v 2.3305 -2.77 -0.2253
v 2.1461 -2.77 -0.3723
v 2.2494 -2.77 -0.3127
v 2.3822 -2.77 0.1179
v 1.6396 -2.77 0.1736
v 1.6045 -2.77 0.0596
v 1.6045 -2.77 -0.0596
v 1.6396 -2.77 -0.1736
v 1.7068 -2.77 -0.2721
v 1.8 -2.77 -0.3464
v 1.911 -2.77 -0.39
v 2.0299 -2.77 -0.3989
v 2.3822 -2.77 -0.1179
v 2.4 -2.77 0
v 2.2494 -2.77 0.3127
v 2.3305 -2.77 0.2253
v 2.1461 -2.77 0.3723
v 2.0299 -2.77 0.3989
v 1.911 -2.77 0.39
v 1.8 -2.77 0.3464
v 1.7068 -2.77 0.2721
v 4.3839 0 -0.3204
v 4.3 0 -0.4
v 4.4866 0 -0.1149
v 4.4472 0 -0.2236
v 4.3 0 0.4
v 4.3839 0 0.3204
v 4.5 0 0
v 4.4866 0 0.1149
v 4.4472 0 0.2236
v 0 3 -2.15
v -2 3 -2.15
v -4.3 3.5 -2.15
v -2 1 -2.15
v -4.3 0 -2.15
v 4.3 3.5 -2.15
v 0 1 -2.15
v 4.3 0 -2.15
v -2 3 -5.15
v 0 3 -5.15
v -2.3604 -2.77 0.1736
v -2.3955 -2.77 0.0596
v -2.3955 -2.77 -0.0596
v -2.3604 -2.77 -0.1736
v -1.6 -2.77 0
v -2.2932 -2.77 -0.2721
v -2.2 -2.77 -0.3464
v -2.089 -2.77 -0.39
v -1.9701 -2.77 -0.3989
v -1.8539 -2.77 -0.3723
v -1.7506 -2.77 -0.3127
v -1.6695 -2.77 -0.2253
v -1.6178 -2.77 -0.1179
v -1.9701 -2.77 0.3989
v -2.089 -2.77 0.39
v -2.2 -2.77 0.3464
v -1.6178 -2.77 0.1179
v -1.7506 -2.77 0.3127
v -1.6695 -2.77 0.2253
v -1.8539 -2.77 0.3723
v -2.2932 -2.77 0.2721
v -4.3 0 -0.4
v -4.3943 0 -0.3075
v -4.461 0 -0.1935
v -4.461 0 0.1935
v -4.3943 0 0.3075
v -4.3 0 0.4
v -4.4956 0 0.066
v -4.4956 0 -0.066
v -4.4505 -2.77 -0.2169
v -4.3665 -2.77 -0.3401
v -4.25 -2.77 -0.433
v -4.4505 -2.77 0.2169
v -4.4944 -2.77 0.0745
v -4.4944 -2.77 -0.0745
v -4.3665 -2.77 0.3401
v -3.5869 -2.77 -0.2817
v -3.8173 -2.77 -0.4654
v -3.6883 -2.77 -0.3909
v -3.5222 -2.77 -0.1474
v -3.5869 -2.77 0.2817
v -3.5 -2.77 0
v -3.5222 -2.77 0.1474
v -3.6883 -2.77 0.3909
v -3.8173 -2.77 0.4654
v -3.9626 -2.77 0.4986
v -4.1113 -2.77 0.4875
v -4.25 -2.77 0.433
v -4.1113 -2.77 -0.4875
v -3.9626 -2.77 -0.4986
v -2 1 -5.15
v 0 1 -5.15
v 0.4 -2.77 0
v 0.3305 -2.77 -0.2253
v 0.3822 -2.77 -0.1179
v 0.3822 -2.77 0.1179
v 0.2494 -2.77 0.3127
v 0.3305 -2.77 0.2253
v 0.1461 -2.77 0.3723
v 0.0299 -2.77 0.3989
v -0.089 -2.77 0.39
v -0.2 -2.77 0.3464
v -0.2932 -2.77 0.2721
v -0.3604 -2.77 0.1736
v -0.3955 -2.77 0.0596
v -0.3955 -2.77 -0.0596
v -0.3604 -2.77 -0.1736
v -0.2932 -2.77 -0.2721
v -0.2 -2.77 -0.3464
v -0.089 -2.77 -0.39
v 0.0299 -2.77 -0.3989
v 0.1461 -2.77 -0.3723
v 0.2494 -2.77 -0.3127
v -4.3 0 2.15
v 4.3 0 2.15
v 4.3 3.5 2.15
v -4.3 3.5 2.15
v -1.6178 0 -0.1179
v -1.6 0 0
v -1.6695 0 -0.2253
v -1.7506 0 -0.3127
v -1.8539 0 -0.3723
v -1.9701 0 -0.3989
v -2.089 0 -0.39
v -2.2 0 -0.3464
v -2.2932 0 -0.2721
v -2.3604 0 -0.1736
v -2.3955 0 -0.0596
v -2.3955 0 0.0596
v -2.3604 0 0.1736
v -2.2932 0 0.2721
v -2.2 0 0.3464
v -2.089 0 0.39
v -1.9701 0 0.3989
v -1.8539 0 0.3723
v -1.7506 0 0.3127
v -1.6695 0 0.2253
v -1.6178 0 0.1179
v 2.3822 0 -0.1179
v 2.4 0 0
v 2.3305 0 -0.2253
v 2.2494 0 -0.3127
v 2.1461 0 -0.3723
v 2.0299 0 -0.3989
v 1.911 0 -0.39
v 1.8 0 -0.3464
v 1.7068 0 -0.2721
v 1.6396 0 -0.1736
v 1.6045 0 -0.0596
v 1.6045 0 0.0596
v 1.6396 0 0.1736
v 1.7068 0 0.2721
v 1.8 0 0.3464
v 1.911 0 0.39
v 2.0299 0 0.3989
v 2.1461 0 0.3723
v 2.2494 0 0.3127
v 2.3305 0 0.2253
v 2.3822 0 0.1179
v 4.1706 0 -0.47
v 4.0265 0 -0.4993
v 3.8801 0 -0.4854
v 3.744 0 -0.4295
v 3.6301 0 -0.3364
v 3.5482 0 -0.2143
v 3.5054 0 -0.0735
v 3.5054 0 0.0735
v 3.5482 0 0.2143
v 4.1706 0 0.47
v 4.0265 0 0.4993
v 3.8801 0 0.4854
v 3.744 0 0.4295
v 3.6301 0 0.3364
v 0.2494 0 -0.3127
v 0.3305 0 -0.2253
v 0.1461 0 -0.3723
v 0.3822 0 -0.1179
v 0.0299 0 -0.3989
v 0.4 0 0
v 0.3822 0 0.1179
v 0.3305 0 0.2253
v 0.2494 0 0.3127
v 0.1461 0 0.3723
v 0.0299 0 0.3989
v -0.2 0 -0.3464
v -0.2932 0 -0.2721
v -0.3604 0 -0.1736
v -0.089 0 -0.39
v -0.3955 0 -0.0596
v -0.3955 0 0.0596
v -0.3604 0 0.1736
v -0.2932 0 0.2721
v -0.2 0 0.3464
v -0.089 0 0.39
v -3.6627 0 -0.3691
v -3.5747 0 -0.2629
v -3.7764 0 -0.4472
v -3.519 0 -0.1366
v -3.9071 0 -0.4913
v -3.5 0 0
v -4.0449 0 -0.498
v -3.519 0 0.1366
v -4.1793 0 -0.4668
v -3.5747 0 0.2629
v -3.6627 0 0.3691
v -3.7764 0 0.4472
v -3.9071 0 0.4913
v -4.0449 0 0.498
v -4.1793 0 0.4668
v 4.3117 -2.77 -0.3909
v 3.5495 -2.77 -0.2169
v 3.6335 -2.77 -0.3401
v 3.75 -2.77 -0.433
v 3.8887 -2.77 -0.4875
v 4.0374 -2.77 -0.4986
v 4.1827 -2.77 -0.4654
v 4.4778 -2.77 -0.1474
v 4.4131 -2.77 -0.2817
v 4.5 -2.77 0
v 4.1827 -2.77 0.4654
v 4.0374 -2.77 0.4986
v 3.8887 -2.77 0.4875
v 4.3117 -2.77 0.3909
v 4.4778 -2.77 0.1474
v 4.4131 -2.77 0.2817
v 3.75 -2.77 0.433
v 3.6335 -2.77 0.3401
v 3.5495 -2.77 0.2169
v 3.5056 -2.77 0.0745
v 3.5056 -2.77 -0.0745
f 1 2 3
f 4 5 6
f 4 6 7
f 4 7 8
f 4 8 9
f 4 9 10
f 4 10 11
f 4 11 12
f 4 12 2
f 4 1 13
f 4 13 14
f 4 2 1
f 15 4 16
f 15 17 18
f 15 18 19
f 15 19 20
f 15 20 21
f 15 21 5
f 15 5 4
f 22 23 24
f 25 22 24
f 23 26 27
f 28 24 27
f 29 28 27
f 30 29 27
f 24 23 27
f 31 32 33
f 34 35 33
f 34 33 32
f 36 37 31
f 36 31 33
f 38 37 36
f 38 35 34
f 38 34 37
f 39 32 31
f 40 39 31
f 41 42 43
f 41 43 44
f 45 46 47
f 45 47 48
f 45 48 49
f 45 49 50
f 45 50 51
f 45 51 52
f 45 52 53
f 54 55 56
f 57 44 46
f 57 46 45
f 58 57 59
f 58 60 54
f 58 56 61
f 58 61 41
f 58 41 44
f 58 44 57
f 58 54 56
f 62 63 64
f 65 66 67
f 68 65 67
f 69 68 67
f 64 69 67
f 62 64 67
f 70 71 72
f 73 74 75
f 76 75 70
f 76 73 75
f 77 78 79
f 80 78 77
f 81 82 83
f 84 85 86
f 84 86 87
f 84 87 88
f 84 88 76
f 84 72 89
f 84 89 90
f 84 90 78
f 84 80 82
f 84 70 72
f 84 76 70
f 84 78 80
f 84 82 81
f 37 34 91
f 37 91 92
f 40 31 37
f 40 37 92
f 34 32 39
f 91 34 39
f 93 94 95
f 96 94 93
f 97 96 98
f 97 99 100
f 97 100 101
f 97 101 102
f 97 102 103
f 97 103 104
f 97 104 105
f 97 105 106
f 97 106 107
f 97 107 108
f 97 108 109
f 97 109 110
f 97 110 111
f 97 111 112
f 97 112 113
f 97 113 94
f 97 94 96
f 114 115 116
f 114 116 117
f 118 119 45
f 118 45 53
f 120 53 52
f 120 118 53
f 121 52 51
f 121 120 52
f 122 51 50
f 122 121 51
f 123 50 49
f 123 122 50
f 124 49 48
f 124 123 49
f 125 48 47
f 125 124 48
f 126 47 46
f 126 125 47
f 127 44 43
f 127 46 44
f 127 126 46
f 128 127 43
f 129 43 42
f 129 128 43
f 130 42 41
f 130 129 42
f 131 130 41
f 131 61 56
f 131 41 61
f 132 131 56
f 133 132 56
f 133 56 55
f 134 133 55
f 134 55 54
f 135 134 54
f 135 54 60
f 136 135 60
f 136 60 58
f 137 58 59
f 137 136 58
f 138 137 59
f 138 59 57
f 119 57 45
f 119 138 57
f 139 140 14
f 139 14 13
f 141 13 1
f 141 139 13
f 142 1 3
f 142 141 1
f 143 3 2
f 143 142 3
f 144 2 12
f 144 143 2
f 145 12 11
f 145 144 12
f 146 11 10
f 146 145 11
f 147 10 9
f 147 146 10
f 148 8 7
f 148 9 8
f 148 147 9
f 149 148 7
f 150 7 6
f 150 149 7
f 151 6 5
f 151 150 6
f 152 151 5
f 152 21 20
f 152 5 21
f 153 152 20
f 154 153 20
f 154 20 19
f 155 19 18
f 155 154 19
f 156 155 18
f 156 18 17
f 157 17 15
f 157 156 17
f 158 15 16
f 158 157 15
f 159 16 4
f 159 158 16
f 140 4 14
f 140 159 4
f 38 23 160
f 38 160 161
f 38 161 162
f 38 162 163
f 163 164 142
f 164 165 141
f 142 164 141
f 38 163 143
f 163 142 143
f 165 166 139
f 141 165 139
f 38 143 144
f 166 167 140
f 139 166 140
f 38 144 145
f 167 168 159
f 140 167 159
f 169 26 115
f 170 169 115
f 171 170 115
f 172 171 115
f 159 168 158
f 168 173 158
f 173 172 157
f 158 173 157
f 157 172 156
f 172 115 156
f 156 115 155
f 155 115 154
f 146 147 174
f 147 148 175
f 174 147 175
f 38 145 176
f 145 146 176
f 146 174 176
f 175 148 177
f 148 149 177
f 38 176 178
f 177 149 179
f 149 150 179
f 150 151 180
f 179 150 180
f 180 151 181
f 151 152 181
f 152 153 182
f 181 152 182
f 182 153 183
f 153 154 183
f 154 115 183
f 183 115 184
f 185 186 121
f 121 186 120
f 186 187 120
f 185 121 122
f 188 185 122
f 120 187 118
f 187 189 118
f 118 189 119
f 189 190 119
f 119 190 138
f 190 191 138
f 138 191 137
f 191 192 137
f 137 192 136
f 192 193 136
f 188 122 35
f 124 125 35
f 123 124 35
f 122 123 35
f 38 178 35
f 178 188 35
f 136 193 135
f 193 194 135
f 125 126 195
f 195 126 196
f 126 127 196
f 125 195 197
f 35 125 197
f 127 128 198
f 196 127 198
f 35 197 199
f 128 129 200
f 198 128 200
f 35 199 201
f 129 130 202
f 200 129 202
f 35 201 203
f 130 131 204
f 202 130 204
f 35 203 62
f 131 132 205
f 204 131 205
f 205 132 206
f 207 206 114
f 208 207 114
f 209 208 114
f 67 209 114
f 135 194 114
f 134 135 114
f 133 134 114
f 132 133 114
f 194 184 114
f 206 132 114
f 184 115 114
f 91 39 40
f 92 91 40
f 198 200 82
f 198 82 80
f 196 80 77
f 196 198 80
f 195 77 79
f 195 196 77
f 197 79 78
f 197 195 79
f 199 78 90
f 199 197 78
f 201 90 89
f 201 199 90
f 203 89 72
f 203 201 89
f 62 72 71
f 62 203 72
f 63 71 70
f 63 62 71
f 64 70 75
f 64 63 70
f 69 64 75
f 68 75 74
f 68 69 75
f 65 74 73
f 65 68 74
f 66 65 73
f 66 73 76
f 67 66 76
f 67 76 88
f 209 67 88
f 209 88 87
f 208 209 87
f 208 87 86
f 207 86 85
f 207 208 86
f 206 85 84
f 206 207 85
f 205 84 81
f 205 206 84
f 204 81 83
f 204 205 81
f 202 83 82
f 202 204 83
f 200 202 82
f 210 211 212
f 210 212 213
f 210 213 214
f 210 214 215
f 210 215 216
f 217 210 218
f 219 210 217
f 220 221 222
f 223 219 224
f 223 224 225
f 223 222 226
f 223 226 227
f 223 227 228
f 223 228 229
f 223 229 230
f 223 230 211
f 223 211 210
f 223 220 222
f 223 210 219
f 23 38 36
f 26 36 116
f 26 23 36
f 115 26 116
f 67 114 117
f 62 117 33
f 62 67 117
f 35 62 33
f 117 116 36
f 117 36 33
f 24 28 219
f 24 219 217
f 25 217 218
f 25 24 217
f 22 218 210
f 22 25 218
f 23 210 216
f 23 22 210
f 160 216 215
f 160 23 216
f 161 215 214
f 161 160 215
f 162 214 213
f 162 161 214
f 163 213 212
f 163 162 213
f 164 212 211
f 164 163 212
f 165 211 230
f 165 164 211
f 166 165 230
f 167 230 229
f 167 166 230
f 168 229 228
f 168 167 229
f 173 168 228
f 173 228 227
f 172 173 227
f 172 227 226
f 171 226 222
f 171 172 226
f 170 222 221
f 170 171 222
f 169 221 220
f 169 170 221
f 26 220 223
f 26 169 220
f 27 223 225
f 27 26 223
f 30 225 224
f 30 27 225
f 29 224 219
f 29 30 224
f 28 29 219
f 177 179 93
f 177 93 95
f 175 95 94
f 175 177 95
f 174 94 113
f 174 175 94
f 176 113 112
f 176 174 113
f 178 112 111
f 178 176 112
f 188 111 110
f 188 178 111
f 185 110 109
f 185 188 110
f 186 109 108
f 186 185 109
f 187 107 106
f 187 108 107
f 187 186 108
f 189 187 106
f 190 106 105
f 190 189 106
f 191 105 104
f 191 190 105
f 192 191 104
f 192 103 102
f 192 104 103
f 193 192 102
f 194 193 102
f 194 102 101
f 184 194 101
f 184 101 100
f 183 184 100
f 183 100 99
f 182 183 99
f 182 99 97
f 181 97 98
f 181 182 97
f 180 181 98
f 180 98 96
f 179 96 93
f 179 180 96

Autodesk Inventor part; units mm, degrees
ref_plane "YZ Plane" through (0, 0, 0) normal (1, 0, 0) x (0, 1, 0)
ref_plane "XZ Plane" through (0, 0, 0) normal (0, 1, 0) x (-1, 0, 0)
sketch "Sketch1" plane through (0, 0, 0) normal (0, 1, 0) x (-1, 0, 0)
  line L0 (-4.3, 2.15) -> (4.3, 2.15)
  line L1 (4.3, 2.15) -> (4.3, -2.15)
  line L2 (4.3, -2.15) -> (-4.3, -2.15)
  line L3 (-4.3, -2.15) -> (-4.3, 2.15)
  line L4 (-4.3, 2.15) -> (4.3, -2.15) construction
  line L5 (4.3, 2.15) -> (-4.3, -2.15) construction
  point P0 (0, 0)
  dimension "d0" = 8.6
  dimension "d1" = 4.3
extrude "Extrusion1" add sketch "Sketch1" along normal blind 3.5
sketch "Sketch2" plane through (0, 0, 0) normal (0, -1, 0) x (1, 0, 0)
  circle A0 centre (0, 0) radius 0.4
  circle A1 centre (2, 0) radius 0.4
  circle A2 centre (-2, 0) radius 0.4
  circle A3 centre (-4, 0) radius 0.5
  circle A4 centre (4, 0) radius 0.5
  dimension "d4" = 0.8
  dimension "d5" = 0.8
  dimension "d6" = 0.8
  dimension "d7" = 2
  dimension "d8" = 2
  dimension "d9" = 1
  dimension "d10" = 1
  dimension "d11" = 2
  dimension "d12" = 2
extrude "Extrusion2" add sketch "Sketch2" along normal blind 2.77
ref_plane "Work Plane1" through (0, 2, 0) normal (0, -1, 0) x (1, 0, 0)
sketch "Sketch3" plane through (0, 2, 0) normal (0, -1, 0) x (1, 0, 0)
  line L0 (-2, -2.15) -> (-2, -5.15)
  line L1 (-2, -5.15) -> (0, -5.15)
  line L2 (-2, -2.15) -> (0, -2.15)
  line L3 (0, -2.15) -> (0, -5.15)
  line L4 (-4.3, -2.15) -> (4.3, -2.15) projected
  point P0 (0, 0)
  dimension "d16" = 2
  dimension "d17" = 0
  dimension "d18" = 0
  dimension "d19" = 3
extrude "Extrusion3" add sketch "Sketch3" along normal mid plane 2
properties part number "TE-1825232"
